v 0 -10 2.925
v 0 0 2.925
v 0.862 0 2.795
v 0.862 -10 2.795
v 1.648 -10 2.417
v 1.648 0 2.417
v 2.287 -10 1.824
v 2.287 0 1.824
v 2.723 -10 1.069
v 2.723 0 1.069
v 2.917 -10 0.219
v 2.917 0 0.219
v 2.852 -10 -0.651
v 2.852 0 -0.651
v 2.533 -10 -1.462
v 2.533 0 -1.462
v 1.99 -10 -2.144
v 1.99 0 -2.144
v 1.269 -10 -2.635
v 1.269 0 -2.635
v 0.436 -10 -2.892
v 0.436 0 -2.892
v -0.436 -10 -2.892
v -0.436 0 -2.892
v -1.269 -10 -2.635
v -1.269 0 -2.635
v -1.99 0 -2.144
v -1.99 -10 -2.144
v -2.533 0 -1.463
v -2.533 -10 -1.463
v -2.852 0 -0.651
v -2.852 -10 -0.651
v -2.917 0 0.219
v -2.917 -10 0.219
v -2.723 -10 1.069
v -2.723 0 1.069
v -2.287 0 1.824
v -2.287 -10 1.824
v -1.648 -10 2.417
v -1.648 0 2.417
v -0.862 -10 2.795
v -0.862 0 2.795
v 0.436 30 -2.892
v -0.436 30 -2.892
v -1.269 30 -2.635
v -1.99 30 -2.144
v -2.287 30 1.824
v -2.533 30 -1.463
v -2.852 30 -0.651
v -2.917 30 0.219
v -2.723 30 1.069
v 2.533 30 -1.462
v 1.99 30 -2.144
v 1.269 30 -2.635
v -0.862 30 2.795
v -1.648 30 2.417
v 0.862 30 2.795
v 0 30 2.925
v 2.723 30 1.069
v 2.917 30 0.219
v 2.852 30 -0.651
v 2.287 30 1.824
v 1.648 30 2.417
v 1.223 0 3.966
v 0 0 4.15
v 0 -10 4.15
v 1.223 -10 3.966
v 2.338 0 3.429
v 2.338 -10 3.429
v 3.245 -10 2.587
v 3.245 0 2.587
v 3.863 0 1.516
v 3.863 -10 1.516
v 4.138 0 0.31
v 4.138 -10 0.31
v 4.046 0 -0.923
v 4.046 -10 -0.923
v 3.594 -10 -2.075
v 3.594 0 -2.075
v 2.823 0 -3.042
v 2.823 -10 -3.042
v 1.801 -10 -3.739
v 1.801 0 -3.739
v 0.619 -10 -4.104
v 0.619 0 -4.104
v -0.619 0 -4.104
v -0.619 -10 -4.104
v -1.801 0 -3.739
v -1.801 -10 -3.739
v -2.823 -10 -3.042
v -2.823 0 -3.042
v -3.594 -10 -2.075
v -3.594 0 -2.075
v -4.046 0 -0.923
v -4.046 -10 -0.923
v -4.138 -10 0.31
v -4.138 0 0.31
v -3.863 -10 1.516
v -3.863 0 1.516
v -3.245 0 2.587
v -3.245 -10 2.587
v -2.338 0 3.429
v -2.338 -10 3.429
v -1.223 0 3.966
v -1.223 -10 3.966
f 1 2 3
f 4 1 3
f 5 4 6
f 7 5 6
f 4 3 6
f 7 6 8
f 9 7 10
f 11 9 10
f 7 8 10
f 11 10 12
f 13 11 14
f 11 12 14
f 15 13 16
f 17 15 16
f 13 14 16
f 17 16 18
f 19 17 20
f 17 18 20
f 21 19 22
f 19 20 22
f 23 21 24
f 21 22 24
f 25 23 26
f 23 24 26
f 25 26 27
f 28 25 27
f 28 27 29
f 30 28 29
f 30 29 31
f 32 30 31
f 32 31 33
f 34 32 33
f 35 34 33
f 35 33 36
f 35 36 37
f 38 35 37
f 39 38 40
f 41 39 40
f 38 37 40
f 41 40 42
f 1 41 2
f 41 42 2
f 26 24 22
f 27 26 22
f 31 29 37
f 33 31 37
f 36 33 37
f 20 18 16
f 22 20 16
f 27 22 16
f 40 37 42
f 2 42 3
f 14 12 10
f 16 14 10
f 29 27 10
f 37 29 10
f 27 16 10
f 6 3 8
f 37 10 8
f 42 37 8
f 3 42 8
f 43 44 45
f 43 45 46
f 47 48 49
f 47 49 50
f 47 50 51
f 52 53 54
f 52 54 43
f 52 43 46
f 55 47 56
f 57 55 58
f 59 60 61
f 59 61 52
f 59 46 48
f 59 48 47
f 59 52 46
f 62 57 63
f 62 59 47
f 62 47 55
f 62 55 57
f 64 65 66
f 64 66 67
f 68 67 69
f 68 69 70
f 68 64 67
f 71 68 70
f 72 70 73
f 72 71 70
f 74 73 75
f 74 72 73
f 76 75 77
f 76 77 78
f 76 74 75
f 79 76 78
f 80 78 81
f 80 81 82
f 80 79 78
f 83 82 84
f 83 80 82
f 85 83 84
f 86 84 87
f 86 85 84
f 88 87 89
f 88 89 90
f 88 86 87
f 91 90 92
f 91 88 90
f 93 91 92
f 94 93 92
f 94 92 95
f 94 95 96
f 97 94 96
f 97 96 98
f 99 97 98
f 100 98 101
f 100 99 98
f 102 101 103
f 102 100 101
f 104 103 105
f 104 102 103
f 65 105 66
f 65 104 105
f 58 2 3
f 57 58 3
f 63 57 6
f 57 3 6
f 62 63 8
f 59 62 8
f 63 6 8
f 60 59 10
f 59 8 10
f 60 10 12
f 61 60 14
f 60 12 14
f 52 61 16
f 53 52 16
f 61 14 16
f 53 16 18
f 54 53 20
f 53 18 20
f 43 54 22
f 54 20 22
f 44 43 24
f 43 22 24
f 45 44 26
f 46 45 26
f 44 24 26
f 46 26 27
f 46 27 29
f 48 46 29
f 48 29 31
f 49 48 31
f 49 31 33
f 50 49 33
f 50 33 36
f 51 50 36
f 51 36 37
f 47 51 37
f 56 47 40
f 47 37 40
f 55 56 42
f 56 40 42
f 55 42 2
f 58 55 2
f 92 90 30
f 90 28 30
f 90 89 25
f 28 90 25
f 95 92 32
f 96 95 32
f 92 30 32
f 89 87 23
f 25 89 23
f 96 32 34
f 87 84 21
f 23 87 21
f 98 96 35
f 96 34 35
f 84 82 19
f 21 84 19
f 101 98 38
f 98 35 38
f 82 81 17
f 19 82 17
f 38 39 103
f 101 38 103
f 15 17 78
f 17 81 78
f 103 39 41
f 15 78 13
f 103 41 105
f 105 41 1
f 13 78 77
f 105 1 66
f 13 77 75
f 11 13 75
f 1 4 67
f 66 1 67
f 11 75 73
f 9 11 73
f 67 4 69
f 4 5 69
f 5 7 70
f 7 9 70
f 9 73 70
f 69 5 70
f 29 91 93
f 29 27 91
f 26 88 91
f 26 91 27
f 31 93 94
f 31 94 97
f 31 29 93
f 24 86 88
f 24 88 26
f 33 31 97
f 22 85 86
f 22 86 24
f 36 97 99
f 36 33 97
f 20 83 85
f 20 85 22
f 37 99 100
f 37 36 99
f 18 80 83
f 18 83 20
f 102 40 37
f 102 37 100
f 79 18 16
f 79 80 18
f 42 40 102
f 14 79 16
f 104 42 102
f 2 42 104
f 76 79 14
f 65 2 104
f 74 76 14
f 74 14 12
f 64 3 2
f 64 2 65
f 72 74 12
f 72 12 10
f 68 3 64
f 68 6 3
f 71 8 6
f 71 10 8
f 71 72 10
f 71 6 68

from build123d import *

# Parameters (mm, degrees)
SKETCH2_R           = 2.925
BOSS_EXTRUDE1_DEPTH = 30
SKETCH2_3_R         = 4.15
SKETCH2_3_R_2       = 2.925
BOSS_EXTRUDE2_DEPTH = 10


with BuildPart() as part:
    # Sketch2 → Boss-Extrude1 (new body)
    with BuildSketch(Plane(origin=(0, 0, 0), x_dir=(1, 0, 0), z_dir=(0, 1, 0))):
        Circle(SKETCH2_R)
    extrude(amount=BOSS_EXTRUDE1_DEPTH)


with BuildPart() as body_2:
    # Sketch2<3> → Boss-Extrude2 (new body)
    with BuildSketch(Plane(origin=(0, 0, 0), x_dir=(1, 0, 0), z_dir=(0, 1, 0))):
        Circle(SKETCH2_3_R)
        Circle(SKETCH2_3_R_2, mode=Mode.SUBTRACT)
    extrude(amount=-BOSS_EXTRUDE2_DEPTH)


solid = Compound([part.part, body_2.part])
